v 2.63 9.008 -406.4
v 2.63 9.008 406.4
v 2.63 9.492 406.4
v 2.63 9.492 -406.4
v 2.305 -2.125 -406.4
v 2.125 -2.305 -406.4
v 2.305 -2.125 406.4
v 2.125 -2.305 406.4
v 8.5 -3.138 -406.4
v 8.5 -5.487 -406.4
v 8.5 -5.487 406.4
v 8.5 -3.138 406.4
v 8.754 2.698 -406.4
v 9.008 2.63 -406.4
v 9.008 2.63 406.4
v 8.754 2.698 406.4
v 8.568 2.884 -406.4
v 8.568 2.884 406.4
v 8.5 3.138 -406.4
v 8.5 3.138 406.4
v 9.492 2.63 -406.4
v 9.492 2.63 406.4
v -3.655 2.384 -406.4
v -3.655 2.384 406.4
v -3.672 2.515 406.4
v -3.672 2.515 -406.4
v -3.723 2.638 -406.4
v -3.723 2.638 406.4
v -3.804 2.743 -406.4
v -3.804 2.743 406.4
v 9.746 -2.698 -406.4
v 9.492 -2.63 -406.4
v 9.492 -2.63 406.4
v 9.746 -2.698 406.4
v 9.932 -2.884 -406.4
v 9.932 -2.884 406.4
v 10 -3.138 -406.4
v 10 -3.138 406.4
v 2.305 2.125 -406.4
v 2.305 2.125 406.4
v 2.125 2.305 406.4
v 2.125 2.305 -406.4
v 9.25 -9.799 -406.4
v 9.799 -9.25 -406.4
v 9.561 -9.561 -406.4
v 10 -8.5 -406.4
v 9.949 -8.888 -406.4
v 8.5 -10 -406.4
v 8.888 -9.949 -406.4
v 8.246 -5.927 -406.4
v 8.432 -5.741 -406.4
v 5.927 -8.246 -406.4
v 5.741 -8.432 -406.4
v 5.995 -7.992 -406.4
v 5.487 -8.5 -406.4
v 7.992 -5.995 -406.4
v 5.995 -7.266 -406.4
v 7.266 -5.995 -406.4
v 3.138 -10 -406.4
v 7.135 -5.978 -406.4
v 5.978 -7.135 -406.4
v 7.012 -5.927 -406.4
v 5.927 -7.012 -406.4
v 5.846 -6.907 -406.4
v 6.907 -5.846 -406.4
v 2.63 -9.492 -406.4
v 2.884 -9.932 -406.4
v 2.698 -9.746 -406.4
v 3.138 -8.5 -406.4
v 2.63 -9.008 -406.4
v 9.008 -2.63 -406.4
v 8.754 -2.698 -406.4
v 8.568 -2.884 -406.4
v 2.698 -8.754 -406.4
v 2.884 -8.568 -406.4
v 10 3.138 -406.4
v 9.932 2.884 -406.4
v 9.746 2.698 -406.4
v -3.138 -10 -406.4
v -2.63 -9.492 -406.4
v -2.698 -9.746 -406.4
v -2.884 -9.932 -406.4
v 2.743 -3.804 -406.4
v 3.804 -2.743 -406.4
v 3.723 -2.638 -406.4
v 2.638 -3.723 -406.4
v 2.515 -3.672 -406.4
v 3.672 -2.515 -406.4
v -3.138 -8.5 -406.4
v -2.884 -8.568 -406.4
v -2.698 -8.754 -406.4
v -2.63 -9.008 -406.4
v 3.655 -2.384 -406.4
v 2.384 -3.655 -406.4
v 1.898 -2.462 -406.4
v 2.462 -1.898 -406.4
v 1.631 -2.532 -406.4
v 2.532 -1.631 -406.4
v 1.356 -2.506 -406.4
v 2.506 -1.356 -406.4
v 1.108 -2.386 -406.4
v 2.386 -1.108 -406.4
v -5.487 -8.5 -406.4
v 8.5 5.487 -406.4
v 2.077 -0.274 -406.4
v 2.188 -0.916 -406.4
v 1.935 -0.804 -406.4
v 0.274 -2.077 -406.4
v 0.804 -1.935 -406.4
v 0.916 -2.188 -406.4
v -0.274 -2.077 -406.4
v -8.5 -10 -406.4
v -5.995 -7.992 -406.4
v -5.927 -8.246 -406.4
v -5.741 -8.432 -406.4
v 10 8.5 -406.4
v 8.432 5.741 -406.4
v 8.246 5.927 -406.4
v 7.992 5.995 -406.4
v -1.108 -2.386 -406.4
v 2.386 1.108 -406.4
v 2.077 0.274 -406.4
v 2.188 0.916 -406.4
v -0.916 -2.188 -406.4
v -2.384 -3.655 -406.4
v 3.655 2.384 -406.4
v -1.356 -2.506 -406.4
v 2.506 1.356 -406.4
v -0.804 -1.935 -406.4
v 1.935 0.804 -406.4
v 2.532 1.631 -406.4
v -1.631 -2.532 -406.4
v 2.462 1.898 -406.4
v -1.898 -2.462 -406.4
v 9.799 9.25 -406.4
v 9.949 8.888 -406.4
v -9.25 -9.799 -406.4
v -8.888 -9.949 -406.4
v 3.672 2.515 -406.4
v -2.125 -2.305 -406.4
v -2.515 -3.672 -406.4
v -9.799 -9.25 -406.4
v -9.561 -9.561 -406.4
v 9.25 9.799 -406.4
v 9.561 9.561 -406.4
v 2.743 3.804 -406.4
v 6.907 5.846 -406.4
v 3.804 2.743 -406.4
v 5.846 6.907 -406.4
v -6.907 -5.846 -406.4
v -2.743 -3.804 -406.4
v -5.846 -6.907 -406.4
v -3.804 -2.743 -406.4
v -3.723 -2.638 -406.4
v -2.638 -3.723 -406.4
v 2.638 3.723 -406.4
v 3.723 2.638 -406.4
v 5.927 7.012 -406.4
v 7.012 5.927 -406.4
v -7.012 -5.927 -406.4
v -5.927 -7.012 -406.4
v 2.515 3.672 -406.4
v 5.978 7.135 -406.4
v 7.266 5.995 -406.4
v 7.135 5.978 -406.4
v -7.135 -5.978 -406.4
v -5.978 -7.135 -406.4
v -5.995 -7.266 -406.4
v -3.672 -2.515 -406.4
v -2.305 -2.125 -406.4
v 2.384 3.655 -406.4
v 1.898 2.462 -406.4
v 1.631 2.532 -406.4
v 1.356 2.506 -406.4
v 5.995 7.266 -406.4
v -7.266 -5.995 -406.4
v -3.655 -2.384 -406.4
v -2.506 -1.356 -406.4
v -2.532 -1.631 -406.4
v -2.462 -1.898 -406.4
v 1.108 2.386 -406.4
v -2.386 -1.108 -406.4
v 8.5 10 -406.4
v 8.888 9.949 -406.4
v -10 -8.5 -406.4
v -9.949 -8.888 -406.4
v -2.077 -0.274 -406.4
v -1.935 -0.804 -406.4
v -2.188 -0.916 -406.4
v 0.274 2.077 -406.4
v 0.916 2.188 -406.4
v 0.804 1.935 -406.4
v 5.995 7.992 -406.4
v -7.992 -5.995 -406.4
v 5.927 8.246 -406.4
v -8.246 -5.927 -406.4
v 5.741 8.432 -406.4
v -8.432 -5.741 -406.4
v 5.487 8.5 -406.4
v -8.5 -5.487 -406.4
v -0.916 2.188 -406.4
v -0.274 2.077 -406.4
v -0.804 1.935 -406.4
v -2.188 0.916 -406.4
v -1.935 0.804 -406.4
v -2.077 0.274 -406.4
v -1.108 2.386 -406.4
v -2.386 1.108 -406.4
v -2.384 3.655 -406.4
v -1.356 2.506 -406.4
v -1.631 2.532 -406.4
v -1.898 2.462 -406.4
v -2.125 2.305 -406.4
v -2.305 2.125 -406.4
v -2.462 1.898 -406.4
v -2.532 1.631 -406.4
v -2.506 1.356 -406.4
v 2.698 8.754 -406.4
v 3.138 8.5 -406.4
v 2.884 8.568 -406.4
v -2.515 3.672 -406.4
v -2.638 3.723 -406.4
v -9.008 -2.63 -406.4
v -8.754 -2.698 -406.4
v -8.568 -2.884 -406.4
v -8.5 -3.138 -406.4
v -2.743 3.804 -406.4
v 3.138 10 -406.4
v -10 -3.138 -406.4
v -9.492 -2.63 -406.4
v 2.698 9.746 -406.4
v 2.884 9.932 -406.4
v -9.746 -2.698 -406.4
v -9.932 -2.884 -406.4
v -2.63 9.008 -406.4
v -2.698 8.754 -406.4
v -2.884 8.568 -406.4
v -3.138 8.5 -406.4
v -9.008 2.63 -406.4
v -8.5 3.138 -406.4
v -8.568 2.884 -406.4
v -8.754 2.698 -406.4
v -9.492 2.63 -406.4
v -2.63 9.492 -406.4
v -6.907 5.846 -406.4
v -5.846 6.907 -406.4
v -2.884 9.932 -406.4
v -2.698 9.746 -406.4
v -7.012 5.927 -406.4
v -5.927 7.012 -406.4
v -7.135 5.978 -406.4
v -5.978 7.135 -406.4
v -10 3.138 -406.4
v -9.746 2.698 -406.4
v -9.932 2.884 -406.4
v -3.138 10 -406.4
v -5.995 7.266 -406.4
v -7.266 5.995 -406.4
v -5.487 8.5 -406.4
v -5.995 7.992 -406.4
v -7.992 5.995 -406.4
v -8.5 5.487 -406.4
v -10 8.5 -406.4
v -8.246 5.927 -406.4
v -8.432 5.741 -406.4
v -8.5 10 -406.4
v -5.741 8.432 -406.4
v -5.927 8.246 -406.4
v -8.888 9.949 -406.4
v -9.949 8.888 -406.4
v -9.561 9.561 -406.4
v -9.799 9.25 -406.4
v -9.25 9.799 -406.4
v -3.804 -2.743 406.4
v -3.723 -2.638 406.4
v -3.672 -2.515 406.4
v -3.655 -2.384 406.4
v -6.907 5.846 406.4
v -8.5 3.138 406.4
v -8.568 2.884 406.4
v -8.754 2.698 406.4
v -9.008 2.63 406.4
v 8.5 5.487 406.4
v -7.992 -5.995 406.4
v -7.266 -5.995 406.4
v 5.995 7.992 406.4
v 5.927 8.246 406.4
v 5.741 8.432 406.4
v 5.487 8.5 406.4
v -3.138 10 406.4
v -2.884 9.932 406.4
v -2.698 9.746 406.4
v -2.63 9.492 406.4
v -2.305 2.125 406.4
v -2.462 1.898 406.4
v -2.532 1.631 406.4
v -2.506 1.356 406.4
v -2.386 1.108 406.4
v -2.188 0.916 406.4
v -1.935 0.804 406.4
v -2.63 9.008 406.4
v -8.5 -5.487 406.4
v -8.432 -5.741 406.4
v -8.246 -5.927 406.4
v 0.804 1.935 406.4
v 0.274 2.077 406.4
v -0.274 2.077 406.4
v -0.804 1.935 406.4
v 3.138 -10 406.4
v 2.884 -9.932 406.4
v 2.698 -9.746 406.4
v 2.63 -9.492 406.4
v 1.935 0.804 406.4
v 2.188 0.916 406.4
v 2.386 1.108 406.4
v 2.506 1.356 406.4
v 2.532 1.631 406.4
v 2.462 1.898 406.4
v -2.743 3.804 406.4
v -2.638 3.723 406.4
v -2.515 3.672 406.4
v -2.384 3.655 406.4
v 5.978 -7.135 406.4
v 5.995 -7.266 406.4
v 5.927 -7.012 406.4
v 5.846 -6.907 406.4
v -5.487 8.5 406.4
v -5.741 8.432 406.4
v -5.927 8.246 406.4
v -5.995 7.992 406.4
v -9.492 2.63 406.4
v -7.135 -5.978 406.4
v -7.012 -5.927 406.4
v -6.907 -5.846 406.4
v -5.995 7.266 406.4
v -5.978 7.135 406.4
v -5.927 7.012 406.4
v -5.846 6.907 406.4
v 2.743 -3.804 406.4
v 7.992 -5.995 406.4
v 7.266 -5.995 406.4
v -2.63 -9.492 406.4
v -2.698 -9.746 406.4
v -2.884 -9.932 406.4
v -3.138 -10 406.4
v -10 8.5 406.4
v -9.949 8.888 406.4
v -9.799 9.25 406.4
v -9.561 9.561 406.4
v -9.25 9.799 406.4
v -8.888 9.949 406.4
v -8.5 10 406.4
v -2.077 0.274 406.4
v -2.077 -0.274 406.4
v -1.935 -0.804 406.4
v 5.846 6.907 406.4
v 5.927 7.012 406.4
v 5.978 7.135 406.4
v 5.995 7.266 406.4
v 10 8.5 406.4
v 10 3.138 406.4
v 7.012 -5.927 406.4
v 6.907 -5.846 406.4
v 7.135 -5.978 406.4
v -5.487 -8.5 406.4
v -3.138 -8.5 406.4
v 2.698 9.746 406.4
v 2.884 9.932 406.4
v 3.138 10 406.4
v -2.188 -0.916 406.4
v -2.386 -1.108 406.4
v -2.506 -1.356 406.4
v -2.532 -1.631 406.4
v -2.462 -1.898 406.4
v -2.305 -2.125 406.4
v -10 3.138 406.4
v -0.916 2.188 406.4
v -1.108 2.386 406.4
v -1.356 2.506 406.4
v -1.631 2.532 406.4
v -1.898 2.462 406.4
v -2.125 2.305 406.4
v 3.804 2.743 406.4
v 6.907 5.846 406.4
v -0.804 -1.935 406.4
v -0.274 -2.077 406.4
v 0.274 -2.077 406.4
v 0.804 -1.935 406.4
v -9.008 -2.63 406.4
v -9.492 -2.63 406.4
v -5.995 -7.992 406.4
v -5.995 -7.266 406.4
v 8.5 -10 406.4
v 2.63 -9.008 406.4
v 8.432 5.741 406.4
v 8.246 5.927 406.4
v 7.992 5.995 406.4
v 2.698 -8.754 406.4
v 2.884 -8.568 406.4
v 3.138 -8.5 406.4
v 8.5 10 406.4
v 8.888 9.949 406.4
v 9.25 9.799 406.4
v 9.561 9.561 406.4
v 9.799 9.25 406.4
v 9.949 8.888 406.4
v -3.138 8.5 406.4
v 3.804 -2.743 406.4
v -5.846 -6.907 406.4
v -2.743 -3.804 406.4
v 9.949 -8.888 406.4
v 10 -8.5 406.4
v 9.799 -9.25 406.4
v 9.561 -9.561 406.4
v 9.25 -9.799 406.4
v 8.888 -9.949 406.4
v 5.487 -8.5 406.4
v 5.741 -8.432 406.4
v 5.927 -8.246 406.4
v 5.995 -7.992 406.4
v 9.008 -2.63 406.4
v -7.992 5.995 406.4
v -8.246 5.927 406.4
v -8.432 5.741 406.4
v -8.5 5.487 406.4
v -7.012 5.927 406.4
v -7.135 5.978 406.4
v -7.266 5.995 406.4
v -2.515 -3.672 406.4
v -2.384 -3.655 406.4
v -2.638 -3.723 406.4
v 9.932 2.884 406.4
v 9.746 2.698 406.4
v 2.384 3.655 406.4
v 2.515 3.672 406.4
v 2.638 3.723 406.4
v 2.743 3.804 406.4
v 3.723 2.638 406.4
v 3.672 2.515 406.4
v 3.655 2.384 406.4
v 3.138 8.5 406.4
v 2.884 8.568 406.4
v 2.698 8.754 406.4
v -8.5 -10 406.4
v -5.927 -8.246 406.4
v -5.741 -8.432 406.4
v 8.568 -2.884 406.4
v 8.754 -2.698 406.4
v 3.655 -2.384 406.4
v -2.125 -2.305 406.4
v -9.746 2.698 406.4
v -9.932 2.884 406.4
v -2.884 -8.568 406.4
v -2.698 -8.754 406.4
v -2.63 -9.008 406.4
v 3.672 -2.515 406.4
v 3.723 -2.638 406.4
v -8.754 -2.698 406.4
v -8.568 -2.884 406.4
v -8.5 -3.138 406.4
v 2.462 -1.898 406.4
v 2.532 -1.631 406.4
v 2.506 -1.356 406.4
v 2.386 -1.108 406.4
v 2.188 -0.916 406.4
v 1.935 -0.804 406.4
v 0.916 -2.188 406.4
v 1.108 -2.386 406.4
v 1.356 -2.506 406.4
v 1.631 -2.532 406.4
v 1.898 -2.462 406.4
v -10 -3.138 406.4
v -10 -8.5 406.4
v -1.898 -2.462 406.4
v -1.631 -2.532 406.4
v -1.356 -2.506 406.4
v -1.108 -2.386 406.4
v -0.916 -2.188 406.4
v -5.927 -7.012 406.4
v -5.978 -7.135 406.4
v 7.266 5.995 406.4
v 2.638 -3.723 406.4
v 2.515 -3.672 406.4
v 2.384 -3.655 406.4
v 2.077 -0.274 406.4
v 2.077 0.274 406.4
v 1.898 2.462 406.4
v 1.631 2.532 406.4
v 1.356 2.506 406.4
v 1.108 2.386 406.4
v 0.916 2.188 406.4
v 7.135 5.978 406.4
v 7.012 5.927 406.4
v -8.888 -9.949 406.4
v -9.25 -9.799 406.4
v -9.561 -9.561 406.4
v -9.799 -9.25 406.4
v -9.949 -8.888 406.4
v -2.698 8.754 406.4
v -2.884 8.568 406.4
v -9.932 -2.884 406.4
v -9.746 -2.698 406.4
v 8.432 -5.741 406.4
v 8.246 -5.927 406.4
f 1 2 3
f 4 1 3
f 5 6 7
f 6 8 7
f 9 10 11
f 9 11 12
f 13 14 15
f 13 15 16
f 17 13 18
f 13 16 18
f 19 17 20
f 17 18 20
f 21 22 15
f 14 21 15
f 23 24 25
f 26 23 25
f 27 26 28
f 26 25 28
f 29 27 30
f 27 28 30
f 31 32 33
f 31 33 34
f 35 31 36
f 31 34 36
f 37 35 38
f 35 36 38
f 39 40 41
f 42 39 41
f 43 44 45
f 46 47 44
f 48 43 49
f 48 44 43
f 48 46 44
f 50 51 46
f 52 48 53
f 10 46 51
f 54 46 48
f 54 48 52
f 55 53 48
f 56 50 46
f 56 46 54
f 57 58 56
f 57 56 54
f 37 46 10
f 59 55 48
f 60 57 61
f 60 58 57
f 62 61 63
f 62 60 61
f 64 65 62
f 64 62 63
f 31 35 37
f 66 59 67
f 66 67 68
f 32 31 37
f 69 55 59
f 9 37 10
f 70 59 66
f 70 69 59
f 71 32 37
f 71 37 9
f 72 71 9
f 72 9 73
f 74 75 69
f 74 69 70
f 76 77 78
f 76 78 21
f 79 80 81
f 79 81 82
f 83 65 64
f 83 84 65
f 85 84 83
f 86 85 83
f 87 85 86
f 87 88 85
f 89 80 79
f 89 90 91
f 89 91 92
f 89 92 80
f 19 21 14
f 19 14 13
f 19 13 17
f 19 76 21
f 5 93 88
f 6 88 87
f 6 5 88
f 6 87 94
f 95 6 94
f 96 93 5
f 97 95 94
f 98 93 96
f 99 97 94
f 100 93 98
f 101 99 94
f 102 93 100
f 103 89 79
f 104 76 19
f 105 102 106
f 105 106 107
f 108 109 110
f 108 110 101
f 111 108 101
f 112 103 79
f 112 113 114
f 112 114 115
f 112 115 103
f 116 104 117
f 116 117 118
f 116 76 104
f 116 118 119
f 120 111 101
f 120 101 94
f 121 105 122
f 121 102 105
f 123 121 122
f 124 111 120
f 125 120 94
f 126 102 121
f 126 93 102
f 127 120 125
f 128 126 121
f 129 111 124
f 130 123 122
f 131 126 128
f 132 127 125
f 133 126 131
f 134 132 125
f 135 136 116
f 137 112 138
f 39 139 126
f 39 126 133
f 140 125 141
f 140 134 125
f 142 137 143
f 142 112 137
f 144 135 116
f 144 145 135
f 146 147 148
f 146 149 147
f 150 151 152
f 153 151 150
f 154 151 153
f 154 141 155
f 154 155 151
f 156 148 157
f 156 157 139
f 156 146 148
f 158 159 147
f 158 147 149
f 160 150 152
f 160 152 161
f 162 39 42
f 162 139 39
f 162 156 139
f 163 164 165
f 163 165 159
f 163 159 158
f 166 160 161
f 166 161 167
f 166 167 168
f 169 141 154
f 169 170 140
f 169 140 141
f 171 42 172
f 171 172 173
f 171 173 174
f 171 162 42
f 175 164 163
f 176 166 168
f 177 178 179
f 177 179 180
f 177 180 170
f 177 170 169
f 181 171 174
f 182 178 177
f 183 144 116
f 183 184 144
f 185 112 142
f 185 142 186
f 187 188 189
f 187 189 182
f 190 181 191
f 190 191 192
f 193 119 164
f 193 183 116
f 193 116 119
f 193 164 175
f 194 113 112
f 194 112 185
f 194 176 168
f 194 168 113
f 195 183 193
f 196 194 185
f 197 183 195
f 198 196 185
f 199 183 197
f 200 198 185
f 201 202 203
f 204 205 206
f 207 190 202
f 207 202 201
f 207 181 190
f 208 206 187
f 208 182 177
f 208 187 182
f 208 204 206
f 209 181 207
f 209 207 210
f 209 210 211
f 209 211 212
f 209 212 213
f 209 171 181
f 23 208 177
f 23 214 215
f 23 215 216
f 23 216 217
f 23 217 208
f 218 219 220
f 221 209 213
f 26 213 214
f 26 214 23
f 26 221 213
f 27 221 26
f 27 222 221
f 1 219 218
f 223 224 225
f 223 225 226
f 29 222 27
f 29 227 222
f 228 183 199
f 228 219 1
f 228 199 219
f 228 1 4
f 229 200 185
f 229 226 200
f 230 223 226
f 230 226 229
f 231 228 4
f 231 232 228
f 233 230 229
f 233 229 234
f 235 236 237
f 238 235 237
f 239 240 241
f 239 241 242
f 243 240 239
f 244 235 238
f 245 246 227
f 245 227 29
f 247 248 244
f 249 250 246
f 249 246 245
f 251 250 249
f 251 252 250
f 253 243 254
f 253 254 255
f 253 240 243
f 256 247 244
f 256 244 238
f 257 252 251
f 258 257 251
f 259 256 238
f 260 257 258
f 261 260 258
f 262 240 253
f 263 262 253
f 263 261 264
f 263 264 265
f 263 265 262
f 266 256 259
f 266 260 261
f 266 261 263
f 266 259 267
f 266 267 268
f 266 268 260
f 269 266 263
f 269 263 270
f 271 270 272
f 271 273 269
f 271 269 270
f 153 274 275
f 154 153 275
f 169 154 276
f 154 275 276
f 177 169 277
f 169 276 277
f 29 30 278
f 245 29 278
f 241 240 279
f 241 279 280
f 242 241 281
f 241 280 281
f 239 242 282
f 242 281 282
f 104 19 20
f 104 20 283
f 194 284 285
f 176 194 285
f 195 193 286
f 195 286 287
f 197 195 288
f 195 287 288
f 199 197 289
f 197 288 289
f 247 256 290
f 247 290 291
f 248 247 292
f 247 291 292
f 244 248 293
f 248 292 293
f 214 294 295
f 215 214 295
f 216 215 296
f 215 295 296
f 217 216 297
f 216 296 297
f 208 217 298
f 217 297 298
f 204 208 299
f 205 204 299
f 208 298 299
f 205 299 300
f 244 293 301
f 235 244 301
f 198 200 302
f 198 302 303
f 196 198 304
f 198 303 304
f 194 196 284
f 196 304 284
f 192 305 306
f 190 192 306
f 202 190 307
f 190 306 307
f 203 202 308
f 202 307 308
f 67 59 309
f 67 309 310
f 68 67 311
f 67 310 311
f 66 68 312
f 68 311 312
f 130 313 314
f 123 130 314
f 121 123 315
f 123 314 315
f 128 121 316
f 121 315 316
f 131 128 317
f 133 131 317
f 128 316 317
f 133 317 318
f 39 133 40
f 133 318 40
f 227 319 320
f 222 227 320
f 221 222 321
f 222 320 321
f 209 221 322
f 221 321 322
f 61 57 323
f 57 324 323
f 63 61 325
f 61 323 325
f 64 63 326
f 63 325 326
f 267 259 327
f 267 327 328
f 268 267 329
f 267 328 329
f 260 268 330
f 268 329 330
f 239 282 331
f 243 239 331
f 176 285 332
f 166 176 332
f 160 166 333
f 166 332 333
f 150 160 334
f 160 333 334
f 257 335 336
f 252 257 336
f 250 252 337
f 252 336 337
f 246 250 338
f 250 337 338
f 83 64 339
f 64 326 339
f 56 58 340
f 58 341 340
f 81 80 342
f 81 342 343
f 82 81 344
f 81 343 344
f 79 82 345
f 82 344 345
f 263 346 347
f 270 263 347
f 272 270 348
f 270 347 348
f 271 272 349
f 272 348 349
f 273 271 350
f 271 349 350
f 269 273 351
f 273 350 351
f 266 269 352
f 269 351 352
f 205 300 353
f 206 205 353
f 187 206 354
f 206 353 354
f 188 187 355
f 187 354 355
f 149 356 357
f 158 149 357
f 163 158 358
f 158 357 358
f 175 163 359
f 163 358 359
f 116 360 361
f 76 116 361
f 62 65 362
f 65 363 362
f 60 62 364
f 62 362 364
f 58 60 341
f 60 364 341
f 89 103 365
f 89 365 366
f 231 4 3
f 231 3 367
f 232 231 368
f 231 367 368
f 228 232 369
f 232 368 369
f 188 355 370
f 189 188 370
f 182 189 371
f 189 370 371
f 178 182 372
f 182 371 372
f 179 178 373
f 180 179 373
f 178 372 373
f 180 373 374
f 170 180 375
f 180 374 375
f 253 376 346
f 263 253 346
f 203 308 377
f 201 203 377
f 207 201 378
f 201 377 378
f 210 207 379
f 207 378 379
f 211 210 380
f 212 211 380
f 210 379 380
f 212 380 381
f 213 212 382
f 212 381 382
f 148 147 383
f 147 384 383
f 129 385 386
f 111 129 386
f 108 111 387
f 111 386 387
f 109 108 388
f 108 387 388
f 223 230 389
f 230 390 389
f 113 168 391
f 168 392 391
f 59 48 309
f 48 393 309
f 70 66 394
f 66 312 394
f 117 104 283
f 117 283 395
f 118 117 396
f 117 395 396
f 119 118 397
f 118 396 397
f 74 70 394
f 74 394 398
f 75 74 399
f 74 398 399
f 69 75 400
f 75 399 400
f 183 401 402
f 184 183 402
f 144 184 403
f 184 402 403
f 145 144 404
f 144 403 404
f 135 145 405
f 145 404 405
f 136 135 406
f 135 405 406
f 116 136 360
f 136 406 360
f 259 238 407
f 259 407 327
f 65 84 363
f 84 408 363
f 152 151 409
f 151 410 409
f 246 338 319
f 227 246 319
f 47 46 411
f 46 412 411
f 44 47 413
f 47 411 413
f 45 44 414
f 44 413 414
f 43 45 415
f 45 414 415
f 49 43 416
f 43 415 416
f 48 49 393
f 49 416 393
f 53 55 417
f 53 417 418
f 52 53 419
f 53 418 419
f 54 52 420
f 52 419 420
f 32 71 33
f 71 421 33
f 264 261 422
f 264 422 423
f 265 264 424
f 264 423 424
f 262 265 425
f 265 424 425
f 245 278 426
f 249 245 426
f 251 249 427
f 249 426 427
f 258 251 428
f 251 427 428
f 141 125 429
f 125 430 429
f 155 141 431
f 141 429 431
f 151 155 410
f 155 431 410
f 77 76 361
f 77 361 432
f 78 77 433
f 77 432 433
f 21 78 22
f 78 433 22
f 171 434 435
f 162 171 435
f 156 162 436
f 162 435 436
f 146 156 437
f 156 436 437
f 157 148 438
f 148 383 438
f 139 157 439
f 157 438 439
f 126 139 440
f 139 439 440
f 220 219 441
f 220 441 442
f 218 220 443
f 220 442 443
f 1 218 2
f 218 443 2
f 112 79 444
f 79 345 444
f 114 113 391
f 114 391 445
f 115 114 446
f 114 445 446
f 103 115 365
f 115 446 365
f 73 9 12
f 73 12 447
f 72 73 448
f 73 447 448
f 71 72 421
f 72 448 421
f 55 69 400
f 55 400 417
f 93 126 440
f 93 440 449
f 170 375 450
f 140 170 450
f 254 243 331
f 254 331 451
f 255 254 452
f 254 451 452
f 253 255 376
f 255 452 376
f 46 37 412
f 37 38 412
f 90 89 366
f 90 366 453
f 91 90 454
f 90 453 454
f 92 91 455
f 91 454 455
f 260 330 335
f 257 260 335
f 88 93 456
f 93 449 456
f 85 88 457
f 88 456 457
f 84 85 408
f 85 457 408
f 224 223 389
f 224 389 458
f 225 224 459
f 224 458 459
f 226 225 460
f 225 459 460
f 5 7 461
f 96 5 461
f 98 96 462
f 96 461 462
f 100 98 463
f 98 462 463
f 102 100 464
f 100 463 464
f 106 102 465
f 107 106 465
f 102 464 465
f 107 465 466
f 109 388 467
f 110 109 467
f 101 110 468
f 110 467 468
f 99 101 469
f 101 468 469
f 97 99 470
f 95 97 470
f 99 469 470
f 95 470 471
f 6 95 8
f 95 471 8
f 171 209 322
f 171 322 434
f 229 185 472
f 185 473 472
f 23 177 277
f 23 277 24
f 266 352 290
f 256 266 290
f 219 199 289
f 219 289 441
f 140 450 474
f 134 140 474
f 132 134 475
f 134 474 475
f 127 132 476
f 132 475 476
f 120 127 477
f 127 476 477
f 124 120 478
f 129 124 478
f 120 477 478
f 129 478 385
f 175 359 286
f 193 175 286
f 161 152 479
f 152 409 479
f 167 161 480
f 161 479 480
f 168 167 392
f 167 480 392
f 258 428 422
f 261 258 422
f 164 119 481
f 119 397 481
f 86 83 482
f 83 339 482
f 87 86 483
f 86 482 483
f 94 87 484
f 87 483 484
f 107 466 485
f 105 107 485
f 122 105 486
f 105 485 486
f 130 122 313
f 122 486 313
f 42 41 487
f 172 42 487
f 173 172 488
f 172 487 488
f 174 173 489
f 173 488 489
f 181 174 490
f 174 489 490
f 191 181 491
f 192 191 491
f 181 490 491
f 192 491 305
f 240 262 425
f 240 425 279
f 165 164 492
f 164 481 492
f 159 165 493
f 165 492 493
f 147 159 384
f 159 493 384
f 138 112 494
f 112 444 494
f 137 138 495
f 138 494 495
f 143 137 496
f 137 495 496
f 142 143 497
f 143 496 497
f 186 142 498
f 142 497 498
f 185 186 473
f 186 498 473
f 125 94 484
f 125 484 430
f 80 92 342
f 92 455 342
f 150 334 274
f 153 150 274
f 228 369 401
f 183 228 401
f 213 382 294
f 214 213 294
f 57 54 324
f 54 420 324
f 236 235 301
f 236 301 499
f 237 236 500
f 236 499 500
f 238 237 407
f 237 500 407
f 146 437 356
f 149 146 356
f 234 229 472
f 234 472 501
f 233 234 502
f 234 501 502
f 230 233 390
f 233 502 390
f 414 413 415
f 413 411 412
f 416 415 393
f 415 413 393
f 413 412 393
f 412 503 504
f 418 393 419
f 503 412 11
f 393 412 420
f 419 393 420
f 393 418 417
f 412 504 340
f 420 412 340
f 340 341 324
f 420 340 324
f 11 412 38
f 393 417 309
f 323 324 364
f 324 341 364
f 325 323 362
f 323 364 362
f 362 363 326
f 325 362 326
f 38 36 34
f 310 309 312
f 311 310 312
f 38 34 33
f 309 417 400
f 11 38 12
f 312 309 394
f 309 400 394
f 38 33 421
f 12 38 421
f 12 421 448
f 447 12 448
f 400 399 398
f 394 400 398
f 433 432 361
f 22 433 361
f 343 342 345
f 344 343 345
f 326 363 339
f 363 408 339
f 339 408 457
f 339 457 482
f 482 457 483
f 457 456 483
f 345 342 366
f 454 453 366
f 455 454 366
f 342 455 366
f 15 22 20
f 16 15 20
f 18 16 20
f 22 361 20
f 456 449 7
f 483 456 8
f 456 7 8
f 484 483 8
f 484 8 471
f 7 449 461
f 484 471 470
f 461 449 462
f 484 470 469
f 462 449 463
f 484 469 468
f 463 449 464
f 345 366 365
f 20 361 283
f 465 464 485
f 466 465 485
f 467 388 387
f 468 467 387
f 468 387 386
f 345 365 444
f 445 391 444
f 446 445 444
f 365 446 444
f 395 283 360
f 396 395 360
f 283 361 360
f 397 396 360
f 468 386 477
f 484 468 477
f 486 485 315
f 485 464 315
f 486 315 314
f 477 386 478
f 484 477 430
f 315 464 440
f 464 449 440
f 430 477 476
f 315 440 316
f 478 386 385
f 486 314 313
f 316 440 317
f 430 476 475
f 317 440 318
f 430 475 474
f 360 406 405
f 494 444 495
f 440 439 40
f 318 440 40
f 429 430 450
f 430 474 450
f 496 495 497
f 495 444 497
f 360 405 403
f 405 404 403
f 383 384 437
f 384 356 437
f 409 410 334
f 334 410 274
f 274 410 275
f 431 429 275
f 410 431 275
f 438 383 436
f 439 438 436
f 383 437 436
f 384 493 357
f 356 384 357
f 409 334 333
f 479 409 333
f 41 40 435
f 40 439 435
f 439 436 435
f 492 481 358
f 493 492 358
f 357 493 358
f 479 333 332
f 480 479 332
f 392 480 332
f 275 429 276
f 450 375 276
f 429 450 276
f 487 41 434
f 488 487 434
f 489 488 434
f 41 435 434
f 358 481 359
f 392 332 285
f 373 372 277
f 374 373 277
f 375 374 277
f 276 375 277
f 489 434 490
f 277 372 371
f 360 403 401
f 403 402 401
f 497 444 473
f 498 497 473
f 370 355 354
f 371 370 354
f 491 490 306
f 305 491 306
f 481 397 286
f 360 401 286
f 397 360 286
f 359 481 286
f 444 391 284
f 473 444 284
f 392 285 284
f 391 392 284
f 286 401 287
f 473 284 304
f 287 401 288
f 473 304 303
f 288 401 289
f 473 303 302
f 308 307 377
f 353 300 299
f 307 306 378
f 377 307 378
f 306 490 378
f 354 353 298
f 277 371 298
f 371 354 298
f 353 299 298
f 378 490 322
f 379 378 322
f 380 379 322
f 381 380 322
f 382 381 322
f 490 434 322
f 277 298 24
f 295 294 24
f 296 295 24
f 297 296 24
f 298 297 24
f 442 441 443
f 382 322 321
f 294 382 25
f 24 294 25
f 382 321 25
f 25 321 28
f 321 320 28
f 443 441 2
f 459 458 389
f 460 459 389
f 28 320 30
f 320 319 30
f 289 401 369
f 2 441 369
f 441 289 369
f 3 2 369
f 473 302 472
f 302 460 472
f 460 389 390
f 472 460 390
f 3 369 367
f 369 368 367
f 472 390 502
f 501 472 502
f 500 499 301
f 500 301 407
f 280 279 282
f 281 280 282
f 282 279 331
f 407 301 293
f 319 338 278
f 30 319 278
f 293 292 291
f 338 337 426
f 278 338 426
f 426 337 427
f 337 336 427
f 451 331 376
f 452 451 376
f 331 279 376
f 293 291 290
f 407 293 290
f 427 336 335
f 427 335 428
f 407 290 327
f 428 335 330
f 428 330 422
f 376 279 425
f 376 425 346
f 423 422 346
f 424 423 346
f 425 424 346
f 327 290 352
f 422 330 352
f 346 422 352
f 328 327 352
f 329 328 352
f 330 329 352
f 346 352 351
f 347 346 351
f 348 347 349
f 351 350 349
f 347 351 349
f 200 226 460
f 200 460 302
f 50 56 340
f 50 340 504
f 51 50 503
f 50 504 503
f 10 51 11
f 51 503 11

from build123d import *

# Parameters (mm, degrees)
EXTRUDE1_DEPTH = 406.4


with BuildPart() as part:
    # Sketch1 → Extrude1 (new body, symmetric)
    with BuildSketch(Plane.XY):
        with BuildLine():
            Line((9.492, 2.63), (9.008, 2.63))
            ThreePointArc((9.008, 2.63), (8.648789755, 2.778789755), (8.5, 3.138))
            Line((8.5, 3.138), (8.5, 5.487))
            ThreePointArc((8.5, 5.487), (8.351210245, 5.846210245), (7.992, 5.995))
            Line((7.992, 5.995), (7.266080661, 5.995))
            ThreePointArc((7.266080661, 5.995), (7.071677478, 5.956330803), (6.906870417, 5.846210245))
            Line((6.906870417, 5.846210245), (3.803789755, 2.743129583))
            ThreePointArc((3.803789755, 2.743129583), (3.693669197, 2.578322522), (3.655, 2.383919339))
            Line((3.655, 2.383919339), (3.655, -2.383919339))
            ThreePointArc((3.655, -2.383919339), (3.693669197, -2.578322522), (3.803789755, -2.743129583))
            Line((3.803789755, -2.743129583), (6.906870417, -5.846210245))
            ThreePointArc((6.906870417, -5.846210245), (7.071677478, -5.956330803), (7.266080661, -5.995))
            Line((7.266080661, -5.995), (7.992, -5.995))
            ThreePointArc((7.992, -5.995), (8.351210245, -5.846210245), (8.5, -5.487))
            Line((8.5, -5.487), (8.5, -3.138))
            ThreePointArc((8.5, -3.138), (8.648789755, -2.778789755), (9.008, -2.63))
            Line((9.008, -2.63), (9.492, -2.63))
            ThreePointArc((9.492, -2.63), (9.851210245, -2.778789755), (10, -3.138))
            Line((10, -3.138), (10, -8.5))
            ThreePointArc((10, -8.5), (9.560660172, -9.560660172), (8.5, -10))
            Line((8.5, -10), (3.138, -10))
            ThreePointArc((3.138, -10), (2.778789755, -9.851210245), (2.63, -9.492))
            Line((2.63, -9.492), (2.63, -9.008))
            ThreePointArc((2.63, -9.008), (2.778789755, -8.648789755), (3.138, -8.5))
            Line((3.138, -8.5), (5.487, -8.5))
            ThreePointArc((5.487, -8.5), (5.846210245, -8.351210245), (5.995, -7.992))
            Line((5.995, -7.992), (5.995, -7.266080661))
            ThreePointArc((5.995, -7.266080661), (5.956330803, -7.071677478), (5.846210245, -6.906870417))
            Line((5.846210245, -6.906870417), (2.743129583, -3.803789755))
            ThreePointArc((2.743129583, -3.803789755), (2.578322522, -3.693669197), (2.383919339, -3.655))
            Line((2.383919339, -3.655), (-2.383919339, -3.655))
            ThreePointArc((-2.383919339, -3.655), (-2.578322522, -3.693669197), (-2.743129583, -3.803789755))
            Line((-2.743129583, -3.803789755), (-5.846210245, -6.906870417))
            ThreePointArc((-5.846210245, -6.906870417), (-5.956330803, -7.071677478), (-5.995, -7.266080661))
            Line((-5.995, -7.266080661), (-5.995, -7.992))
            ThreePointArc((-5.995, -7.992), (-5.846210245, -8.351210245), (-5.487, -8.5))
            Line((-5.487, -8.5), (-3.138, -8.5))
            ThreePointArc((-3.138, -8.5), (-2.778789755, -8.648789755), (-2.63, -9.008))
            Line((-2.63, -9.008), (-2.63, -9.492))
            ThreePointArc((-2.63, -9.492), (-2.778789755, -9.851210245), (-3.138, -10))
            Line((-3.138, -10), (-8.5, -10))
            ThreePointArc((-8.5, -10), (-9.560660172, -9.560660172), (-10, -8.5))
            Line((-10, -8.5), (-10, -3.138))
            ThreePointArc((-10, -3.138), (-9.851210245, -2.778789755), (-9.492, -2.63))
            Line((-9.492, -2.63), (-9.008, -2.63))
            ThreePointArc((-9.008, -2.63), (-8.648789755, -2.778789755), (-8.5, -3.138))
            Line((-8.5, -3.138), (-8.5, -5.487))
            ThreePointArc((-8.5, -5.487), (-8.351210245, -5.846210245), (-7.992, -5.995))
            Line((-7.992, -5.995), (-7.266080661, -5.995))
            ThreePointArc((-7.266080661, -5.995), (-7.071677478, -5.956330803), (-6.906870417, -5.846210245))
            Line((-6.906870417, -5.846210245), (-3.803789755, -2.743129583))
            ThreePointArc((-3.803789755, -2.743129583), (-3.693669197, -2.578322522), (-3.655, -2.383919339))
            Line((-3.655, -2.383919339), (-3.655, 2.383919339))
            ThreePointArc((-3.655, 2.383919339), (-3.693669197, 2.578322522), (-3.803789755, 2.743129583))
            Line((-3.803789755, 2.743129583), (-6.906870417, 5.846210245))
            ThreePointArc((-6.906870417, 5.846210245), (-7.071677478, 5.956330803), (-7.266080661, 5.995))
            Line((-7.266080661, 5.995), (-7.992, 5.995))
            ThreePointArc((-7.992, 5.995), (-8.351210245, 5.846210245), (-8.5, 5.487))
            Line((-8.5, 5.487), (-8.5, 3.138))
            ThreePointArc((-8.5, 3.138), (-8.648789755, 2.778789755), (-9.008, 2.63))
            Line((-9.008, 2.63), (-9.492, 2.63))
            ThreePointArc((-9.492, 2.63), (-9.851210245, 2.778789755), (-10, 3.138))
            Line((-10, 3.138), (-10, 8.5))
            ThreePointArc((-10, 8.5), (-9.560660172, 9.560660172), (-8.5, 10))
            Line((-8.5, 10), (-3.138, 10))
            ThreePointArc((-3.138, 10), (-2.778789755, 9.851210245), (-2.63, 9.492))
            Line((-2.63, 9.492), (-2.63, 9.008))
            ThreePointArc((-2.63, 9.008), (-2.778789755, 8.648789755), (-3.138, 8.5))
            Line((-3.138, 8.5), (-5.487, 8.5))
            ThreePointArc((-5.487, 8.5), (-5.846210245, 8.351210245), (-5.995, 7.992))
            Line((-5.995, 7.992), (-5.995, 7.266080661))
            ThreePointArc((-5.995, 7.266080661), (-5.956330803, 7.071677478), (-5.846210245, 6.906870417))
            Line((-5.846210245, 6.906870417), (-2.743129583, 3.803789755))
            ThreePointArc((-2.743129583, 3.803789755), (-2.578322522, 3.693669197), (-2.383919339, 3.655))
            Line((-2.383919339, 3.655), (2.383919339, 3.655))
            ThreePointArc((2.383919339, 3.655), (2.578322522, 3.693669197), (2.743129583, 3.803789755))
            Line((2.743129583, 3.803789755), (5.846210245, 6.906870417))
            ThreePointArc((5.846210245, 6.906870417), (5.956330803, 7.071677478), (5.995, 7.266080661))
            Line((5.995, 7.266080661), (5.995, 7.992))
            ThreePointArc((5.995, 7.992), (5.846210245, 8.351210245), (5.487, 8.5))
            Line((5.487, 8.5), (3.138, 8.5))
            ThreePointArc((3.138, 8.5), (2.778789755, 8.648789755), (2.63, 9.008))
            Line((2.63, 9.008), (2.63, 9.492))
            ThreePointArc((2.63, 9.492), (2.778789755, 9.851210245), (3.138, 10))
            Line((3.138, 10), (8.5, 10))
            ThreePointArc((8.5, 10), (9.560660172, 9.560660172), (10, 8.5))
            Line((10, 8.5), (10, 3.138))
            ThreePointArc((10, 3.138), (9.851210245, 2.778789755), (9.492, 2.63))
        make_face()
        with BuildLine():
            Line((2.124900844, -2.304505966), (2.304505966, -2.124900844))
            ThreePointArc((2.304505966, -2.124900844), (2.505938017, -1.356467811), (1.935133506, -0.803976718))
            ThreePointArc((1.935133506, -0.803976718), (2.0955, 0), (1.935133506, 0.803976718))
            ThreePointArc((1.935133506, 0.803976718), (2.505938017, 1.356467811), (2.304505966, 2.124900844))
            Line((2.304505966, 2.124900844), (2.124900844, 2.304505966))
            ThreePointArc((2.124900844, 2.304505966), (1.356467811, 2.505938017), (0.803976718, 1.935133506))
            ThreePointArc((0.803976718, 1.935133506), (0, 2.0955), (-0.803976718, 1.935133506))
            ThreePointArc((-0.803976718, 1.935133506), (-1.356467811, 2.505938017), (-2.124900844, 2.304505966))
            Line((-2.124900844, 2.304505966), (-2.304505966, 2.124900844))
            ThreePointArc((-2.304505966, 2.124900844), (-2.505938017, 1.356467811), (-1.935133506, 0.803976718))
            ThreePointArc((-1.935133506, 0.803976718), (-2.0955, 0), (-1.935133506, -0.803976718))
            ThreePointArc((-1.935133506, -0.803976718), (-2.505938017, -1.356467811), (-2.304505966, -2.124900844))
            Line((-2.304505966, -2.124900844), (-2.124900844, -2.304505966))
            ThreePointArc((-2.124900844, -2.304505966), (-1.356467811, -2.505938017), (-0.803976718, -1.935133506))
            ThreePointArc((-0.803976718, -1.935133506), (0, -2.0955), (0.803976718, -1.935133506))
            ThreePointArc((0.803976718, -1.935133506), (1.356467811, -2.505938017), (2.124900844, -2.304505966))
        make_face(mode=Mode.SUBTRACT)
    extrude(amount=EXTRUDE1_DEPTH, both=True)


solid = part.part
